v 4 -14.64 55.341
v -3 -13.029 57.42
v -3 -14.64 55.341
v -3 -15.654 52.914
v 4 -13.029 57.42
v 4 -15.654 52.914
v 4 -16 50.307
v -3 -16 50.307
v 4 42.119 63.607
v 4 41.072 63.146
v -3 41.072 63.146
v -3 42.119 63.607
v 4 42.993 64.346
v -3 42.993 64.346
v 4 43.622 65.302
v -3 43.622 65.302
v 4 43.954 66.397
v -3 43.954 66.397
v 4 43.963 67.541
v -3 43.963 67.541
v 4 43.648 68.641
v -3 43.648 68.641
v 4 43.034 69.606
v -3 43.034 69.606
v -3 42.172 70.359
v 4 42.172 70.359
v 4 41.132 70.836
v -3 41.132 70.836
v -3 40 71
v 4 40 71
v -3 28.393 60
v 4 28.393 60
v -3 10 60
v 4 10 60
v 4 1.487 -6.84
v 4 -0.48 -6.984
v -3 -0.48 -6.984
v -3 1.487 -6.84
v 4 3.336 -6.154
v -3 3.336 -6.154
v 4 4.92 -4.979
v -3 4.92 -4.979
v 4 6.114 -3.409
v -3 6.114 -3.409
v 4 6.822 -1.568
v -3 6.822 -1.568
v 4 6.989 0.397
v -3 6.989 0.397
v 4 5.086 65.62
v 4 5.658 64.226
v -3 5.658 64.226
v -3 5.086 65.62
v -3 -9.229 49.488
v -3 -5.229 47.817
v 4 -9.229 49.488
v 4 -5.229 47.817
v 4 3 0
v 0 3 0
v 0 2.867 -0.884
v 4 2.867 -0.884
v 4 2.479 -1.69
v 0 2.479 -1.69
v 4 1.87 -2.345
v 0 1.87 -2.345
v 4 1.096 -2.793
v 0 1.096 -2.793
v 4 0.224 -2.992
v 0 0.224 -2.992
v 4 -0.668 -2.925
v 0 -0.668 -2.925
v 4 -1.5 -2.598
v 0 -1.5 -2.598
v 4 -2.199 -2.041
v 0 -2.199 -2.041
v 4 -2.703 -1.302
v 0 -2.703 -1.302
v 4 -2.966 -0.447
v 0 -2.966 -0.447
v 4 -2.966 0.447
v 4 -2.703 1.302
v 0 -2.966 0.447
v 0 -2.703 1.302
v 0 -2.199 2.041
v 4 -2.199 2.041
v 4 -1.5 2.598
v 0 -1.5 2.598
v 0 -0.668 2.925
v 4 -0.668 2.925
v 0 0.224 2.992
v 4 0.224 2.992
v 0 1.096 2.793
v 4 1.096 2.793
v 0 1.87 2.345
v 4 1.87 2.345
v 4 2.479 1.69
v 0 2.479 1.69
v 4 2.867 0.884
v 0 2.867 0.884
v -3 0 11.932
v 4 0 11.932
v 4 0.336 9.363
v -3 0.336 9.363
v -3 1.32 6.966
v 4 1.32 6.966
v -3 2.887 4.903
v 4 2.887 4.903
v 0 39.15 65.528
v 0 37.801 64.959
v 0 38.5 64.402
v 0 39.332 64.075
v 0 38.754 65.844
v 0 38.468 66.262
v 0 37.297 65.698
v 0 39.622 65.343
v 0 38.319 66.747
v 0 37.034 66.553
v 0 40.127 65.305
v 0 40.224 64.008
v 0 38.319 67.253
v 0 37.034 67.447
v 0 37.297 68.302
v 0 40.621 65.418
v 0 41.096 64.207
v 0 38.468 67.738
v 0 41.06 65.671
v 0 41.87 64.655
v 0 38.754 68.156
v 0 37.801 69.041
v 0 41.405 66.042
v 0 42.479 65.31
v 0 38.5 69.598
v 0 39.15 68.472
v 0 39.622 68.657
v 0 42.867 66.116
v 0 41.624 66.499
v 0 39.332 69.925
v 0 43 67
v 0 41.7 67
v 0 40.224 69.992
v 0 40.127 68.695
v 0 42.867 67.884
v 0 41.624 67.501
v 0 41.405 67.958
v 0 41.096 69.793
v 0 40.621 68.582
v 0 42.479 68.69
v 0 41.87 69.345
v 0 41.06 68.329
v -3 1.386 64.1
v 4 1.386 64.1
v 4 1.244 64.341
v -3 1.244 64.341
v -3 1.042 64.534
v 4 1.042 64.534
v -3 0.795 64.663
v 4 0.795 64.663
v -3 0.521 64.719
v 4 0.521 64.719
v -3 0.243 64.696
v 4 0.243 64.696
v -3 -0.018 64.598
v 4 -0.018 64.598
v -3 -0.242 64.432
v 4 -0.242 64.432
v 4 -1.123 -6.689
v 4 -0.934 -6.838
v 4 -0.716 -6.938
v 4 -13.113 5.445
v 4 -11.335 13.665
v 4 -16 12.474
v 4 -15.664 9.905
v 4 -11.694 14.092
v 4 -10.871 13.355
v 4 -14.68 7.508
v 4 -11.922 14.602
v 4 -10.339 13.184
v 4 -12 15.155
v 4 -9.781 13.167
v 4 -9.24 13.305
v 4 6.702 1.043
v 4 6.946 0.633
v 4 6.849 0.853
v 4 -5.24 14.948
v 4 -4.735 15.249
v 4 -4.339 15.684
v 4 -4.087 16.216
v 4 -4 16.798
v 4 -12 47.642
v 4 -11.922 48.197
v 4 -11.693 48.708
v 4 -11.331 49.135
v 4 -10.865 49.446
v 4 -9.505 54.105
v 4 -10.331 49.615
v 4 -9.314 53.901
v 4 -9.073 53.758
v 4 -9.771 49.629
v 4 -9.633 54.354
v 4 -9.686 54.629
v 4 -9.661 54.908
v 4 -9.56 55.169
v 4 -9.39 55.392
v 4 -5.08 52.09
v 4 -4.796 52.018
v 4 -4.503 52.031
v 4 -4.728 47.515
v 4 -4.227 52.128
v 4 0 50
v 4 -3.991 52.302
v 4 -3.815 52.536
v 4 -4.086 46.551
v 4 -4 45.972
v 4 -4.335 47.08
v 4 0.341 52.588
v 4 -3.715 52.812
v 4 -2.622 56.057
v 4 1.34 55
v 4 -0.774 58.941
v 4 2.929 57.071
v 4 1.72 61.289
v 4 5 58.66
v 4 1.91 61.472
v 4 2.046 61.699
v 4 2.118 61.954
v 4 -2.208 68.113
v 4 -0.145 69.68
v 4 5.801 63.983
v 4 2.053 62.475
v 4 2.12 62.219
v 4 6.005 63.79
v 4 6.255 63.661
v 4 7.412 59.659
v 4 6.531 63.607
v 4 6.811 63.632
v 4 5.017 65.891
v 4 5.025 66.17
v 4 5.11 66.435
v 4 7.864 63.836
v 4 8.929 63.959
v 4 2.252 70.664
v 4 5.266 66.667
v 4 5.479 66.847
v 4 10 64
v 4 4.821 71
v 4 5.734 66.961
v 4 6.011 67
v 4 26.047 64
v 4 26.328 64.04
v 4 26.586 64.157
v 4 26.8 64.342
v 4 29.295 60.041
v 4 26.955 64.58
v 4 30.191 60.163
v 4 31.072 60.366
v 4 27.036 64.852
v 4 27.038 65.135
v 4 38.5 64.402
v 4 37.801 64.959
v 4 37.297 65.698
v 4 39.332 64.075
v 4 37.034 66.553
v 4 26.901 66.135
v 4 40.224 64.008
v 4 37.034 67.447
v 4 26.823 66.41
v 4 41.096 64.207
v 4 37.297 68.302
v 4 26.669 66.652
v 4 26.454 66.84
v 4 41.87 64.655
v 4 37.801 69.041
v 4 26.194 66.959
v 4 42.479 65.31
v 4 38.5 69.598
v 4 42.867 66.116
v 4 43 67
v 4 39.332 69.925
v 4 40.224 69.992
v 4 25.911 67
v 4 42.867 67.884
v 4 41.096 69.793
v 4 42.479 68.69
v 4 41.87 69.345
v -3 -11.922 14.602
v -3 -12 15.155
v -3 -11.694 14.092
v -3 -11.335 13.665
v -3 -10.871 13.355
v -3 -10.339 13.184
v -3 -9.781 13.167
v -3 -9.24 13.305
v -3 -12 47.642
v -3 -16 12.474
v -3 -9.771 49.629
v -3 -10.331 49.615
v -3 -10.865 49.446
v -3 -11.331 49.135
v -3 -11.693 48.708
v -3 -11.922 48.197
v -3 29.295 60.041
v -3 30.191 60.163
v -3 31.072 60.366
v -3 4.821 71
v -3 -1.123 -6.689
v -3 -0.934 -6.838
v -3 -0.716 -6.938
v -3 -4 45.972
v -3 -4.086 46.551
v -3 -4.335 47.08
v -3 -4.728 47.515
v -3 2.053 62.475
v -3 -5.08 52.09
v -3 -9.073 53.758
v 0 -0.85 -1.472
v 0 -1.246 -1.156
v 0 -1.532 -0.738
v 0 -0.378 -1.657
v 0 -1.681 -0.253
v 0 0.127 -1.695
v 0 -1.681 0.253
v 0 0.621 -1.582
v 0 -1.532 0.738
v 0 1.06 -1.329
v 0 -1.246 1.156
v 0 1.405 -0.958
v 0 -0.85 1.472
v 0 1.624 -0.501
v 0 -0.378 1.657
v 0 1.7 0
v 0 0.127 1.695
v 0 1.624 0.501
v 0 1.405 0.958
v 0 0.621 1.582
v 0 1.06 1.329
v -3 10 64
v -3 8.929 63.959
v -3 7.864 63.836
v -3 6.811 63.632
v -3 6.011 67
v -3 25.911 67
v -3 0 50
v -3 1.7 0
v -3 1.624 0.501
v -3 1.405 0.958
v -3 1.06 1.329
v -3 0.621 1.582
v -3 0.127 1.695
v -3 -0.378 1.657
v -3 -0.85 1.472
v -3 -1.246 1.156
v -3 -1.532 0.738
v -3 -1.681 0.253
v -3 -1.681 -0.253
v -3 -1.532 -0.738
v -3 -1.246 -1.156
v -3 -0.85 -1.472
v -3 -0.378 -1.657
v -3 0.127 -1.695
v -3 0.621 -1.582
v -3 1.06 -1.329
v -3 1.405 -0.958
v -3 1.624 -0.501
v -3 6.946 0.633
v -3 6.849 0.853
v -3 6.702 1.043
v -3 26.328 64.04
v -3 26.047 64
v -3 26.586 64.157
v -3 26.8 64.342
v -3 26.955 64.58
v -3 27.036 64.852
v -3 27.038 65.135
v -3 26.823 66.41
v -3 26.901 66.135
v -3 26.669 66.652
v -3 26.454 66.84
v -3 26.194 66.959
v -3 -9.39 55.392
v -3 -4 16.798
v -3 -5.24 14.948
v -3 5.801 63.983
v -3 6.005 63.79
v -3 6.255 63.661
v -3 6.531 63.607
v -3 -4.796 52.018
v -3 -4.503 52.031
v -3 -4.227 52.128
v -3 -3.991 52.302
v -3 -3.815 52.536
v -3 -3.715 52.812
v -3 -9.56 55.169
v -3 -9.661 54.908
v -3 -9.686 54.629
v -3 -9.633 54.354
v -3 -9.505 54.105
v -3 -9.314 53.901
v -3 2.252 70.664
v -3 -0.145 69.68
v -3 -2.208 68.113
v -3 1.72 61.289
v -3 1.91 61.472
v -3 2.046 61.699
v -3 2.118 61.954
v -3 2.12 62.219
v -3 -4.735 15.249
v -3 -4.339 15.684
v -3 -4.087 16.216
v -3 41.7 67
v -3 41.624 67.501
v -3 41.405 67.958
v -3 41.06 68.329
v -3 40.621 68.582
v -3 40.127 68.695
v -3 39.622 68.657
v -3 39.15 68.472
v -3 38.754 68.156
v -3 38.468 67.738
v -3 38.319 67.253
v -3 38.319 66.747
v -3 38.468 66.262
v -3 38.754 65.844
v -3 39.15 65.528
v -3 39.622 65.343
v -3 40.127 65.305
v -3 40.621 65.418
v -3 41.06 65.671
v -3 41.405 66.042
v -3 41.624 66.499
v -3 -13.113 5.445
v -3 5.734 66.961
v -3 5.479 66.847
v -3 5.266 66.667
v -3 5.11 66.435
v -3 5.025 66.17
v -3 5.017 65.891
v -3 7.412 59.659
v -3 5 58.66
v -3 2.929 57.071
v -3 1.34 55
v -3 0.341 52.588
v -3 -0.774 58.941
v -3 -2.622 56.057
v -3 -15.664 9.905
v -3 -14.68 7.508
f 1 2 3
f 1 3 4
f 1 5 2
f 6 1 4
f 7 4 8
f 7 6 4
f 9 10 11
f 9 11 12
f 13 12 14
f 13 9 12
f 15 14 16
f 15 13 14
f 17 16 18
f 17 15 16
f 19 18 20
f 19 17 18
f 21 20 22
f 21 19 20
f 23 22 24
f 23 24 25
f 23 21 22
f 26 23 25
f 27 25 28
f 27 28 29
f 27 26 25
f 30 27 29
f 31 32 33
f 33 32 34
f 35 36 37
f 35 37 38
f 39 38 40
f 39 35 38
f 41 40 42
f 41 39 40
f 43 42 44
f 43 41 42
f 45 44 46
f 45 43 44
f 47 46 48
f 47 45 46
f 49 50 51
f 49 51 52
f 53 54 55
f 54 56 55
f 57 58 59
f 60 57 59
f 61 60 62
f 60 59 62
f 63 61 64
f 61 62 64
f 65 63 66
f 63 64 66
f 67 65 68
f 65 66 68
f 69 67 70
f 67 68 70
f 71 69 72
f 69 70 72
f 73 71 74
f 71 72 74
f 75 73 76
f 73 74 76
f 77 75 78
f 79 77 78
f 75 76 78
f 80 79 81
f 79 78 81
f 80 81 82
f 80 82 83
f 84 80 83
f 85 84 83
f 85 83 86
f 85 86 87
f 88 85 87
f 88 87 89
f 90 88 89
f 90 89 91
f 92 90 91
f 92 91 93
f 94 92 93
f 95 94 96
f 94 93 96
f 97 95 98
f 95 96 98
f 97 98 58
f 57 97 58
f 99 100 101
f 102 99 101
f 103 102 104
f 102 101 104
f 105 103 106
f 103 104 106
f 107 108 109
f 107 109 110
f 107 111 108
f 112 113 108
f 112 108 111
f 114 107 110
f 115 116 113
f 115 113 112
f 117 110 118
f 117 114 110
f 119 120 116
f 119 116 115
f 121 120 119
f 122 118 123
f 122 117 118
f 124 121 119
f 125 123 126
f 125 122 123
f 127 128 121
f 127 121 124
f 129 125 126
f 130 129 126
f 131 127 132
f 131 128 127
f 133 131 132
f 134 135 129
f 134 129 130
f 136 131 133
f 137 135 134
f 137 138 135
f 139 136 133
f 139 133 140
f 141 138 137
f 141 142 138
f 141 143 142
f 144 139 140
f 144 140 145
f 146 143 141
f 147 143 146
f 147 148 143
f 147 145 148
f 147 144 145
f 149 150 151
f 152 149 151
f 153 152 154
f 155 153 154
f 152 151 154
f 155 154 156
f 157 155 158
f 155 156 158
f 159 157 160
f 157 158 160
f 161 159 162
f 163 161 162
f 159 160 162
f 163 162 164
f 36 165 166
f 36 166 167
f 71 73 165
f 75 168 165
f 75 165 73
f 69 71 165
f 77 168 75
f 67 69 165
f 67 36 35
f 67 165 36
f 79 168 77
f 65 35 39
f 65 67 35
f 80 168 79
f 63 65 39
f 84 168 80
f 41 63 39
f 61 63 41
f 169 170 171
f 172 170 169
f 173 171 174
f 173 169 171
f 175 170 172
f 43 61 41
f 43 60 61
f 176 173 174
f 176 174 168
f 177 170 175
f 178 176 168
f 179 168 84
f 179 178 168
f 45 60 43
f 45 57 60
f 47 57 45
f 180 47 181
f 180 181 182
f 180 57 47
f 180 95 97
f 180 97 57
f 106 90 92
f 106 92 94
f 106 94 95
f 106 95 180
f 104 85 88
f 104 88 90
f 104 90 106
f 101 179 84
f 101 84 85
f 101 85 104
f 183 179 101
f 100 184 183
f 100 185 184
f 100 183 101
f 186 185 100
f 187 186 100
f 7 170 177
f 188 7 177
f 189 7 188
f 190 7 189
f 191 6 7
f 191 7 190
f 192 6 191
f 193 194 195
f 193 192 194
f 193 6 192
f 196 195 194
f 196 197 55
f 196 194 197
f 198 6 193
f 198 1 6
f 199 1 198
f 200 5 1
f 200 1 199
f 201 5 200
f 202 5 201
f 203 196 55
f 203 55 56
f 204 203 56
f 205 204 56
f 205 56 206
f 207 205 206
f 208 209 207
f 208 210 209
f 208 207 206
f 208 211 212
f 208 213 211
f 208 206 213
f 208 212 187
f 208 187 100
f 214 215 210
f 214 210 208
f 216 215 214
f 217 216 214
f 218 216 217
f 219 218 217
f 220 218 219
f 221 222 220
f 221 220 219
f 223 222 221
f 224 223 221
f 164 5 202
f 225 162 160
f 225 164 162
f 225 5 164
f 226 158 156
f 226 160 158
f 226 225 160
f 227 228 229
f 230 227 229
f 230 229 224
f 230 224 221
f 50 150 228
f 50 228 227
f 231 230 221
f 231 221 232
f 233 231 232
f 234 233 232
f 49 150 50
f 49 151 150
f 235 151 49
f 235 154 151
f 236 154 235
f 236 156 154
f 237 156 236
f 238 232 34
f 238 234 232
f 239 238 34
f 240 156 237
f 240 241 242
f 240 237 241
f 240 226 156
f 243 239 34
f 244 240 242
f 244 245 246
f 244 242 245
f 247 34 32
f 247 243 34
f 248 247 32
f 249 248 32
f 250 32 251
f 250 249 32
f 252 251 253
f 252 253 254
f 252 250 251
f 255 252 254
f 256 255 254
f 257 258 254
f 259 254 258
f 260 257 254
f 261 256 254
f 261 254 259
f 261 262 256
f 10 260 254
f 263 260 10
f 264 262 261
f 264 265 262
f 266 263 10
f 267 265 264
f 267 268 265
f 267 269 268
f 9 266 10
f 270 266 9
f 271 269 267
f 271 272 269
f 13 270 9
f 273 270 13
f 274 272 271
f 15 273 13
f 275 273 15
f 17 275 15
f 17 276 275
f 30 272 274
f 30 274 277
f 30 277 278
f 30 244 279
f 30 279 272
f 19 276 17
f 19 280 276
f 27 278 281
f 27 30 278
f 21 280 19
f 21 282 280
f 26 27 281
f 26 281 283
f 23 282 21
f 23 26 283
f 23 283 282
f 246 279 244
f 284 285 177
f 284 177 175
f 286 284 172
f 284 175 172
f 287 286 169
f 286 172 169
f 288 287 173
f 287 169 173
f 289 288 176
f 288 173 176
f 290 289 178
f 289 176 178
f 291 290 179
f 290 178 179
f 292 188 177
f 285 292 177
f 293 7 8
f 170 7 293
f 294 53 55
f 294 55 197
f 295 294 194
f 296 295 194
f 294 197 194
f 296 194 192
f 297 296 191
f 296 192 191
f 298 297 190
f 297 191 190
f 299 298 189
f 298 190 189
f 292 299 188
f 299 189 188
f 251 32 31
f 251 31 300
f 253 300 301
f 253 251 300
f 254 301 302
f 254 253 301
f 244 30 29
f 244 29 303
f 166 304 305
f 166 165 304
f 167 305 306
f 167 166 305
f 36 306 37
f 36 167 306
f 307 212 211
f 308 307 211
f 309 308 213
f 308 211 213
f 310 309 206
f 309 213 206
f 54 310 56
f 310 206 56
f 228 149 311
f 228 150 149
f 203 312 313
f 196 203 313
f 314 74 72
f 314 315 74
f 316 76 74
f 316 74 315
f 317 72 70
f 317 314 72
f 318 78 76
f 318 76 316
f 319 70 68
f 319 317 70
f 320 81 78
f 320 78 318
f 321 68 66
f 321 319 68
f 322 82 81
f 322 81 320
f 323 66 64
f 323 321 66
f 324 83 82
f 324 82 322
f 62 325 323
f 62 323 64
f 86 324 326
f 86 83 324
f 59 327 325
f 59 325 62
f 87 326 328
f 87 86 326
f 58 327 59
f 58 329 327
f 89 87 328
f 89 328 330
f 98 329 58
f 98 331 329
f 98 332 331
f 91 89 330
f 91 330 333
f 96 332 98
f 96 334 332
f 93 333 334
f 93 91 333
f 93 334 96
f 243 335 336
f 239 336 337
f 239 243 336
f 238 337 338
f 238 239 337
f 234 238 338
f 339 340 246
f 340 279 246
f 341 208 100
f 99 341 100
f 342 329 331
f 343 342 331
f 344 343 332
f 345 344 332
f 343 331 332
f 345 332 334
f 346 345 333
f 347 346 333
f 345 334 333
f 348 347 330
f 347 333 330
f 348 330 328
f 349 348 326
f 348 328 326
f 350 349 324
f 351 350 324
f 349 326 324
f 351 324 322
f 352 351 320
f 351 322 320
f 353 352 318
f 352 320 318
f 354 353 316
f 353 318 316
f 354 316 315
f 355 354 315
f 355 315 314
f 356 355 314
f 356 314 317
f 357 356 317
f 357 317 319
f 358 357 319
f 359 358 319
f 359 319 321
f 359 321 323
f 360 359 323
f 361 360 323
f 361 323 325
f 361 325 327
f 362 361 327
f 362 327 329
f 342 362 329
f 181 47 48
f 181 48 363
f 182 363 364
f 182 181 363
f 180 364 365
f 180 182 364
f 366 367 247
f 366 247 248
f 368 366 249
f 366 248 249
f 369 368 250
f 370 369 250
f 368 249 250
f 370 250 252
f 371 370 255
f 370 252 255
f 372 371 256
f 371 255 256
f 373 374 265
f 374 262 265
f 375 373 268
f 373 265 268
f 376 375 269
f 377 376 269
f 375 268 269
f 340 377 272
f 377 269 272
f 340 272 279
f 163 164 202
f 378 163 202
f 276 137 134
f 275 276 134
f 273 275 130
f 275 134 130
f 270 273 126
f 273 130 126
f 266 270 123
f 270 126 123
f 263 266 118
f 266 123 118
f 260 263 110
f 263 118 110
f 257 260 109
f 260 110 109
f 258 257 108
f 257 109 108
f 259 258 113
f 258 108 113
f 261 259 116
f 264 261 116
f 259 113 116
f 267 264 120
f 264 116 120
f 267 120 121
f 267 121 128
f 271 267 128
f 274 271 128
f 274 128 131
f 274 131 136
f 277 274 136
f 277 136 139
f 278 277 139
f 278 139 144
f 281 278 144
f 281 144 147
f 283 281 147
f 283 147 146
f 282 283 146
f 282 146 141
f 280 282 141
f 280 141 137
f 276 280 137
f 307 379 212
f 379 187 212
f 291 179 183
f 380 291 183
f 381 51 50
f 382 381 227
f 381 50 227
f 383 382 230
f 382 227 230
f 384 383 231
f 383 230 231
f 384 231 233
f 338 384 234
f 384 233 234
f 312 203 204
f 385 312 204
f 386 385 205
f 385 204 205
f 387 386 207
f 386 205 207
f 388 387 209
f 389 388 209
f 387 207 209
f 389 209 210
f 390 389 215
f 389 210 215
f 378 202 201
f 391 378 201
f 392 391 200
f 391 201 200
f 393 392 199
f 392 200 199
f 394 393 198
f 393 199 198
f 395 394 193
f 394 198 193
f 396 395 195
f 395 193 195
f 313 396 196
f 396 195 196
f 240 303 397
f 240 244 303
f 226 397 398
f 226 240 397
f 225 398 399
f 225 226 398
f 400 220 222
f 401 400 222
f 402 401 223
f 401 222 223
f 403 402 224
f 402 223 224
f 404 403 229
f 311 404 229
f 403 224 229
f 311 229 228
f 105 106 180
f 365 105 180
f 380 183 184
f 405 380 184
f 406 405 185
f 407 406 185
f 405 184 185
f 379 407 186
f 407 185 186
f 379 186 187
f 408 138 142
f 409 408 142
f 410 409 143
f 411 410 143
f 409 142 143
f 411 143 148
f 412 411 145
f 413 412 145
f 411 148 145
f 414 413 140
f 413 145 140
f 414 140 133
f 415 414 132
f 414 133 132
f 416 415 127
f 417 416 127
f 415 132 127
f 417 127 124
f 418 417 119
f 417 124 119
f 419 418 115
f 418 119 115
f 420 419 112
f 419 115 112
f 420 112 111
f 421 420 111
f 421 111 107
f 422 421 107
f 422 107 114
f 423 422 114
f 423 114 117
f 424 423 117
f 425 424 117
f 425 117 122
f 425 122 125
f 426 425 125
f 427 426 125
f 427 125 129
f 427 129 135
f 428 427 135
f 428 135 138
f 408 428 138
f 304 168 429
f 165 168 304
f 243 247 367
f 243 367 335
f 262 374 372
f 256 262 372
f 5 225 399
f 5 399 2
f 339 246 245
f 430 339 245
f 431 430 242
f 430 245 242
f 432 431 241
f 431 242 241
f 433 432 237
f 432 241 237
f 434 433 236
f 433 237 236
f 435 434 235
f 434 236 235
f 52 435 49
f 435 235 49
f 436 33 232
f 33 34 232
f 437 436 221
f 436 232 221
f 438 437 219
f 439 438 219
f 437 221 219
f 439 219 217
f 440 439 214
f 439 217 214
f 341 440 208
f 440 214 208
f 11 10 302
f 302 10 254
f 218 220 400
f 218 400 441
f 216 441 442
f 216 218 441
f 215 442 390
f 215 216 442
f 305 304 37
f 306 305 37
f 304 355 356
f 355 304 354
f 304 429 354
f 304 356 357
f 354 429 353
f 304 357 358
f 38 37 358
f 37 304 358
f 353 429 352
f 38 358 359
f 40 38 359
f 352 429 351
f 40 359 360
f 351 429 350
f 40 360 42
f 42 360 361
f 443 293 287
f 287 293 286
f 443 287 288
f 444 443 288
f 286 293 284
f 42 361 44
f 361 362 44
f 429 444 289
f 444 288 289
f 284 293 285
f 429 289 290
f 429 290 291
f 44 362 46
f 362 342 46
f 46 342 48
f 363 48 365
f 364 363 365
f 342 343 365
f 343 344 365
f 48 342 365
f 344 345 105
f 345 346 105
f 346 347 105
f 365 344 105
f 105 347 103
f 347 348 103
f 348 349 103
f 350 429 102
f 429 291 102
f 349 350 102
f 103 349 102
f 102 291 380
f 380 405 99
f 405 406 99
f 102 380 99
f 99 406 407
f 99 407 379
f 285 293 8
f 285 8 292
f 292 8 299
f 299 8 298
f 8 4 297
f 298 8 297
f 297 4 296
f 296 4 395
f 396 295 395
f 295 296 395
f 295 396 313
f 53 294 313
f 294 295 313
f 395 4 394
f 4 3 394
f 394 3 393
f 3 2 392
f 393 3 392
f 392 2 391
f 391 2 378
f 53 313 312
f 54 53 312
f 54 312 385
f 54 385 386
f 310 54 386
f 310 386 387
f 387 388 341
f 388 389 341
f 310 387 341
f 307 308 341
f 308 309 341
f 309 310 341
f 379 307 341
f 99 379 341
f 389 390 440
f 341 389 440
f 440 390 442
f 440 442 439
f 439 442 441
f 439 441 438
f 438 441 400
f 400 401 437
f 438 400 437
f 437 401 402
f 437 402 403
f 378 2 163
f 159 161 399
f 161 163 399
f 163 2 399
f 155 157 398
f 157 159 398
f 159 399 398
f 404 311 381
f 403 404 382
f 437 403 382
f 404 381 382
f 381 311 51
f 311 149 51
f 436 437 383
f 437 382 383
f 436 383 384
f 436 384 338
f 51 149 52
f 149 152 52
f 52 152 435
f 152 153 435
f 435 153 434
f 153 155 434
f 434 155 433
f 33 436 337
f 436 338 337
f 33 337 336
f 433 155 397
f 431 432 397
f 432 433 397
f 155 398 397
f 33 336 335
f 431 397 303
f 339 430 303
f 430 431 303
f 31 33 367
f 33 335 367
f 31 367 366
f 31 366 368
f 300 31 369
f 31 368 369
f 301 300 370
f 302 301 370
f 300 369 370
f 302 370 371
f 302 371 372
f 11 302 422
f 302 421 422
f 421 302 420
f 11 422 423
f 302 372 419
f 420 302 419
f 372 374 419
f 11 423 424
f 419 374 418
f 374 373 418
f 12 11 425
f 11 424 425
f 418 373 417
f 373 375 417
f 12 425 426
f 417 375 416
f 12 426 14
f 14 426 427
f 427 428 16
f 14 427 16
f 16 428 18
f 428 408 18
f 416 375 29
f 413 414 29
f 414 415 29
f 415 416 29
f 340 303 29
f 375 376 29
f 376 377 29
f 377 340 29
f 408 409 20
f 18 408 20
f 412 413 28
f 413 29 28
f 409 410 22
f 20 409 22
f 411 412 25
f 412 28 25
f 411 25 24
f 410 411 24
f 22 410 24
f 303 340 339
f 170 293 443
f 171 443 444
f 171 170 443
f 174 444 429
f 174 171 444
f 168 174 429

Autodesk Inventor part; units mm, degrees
ref_plane "YZ Plane" through (0, 0, 0) normal (1, 0, 0) x (0, 1, 0)
ref_plane "XZ Plane" through (0, 0, 0) normal (0, 1, 0) x (-1, 0, 0)
ref_plane "XY Plane" through (0, 0, 0) normal (0, 0, 1) x (1, 0, 0)
sketch "SwingArm A" plane through (0, 0, 0) normal (0, 0, 1) x (1, 0, 0)
  line L0 (-13.1129, 5.4447) -> (-1.1226, -6.6888)
  arc A0 (6.9887, 0.3969) -> (6.7016, 1.0431) centre (5.9903, 0.3402) ccw
  arc A1 (-1.1226, -6.6888) -> (-0.4798, -6.9835) centre (-0.4113, -5.9859) ccw
  line L1 (40, 71) -> (4.8211, 71)
  line L2 (28.3926, 60) -> (0, 60) construction
  line L3 (-2.2079, 68.1129) -> (-13.029, 57.4195)
  line L4 (-16, 50.3066) -> (-16, 12.4737)
  line L5 (0, 60) -> (0, 11.9322) construction
  line L6 (2.8871, 4.9032) -> (6.7016, 1.0431)
  circle A2 centre (0, 0) radius 1.7
  circle A3 centre (40, 67) radius 1.7
  line L7 (40, 67) -> (-8, 67) construction
  line L8 (-8, 67) -> (-8, 8.0955) construction
  line L9 (-8, 8.0955) -> (0, 0) construction
  line L10 (41.0716, 63.1462) -> (31.0716, 60.3655)
  arc A4 (28.3926, 60) -> (31.0716, 60.3655) centre (28.3926, 70) ccw
  circle A5 centre (40, 67) radius 4 construction
  arc A6 (41.0716, 63.1462) -> (40, 71) centre (40, 67) ccw
  circle A7 centre (0, 0) radius 5.5 construction
  arc A8 (10, 60) -> (0, 50) centre (10, 50) ccw
  arc A9 (0, 11.9322) -> (2.8871, 4.9032) centre (10, 11.9322) ccw
  arc A10 (-16, 12.4737) -> (-13.1129, 5.4447) centre (-6, 12.4737) ccw
  arc A11 (-13.029, 57.4195) -> (-16, 50.3066) centre (-6, 50.3066) ccw
  arc A12 (4.8211, 71) -> (-2.2079, 68.1129) centre (4.8211, 61) ccw
  line L11 (-9.2401, 13.305) -> (-5.2401, 14.948)
  line L12 (-4, 16.798) -> (-4, 45.9717)
  line L13 (-5.2292, 47.8172) -> (-9.2292, 49.488)
  line L14 (-12, 47.6425) -> (-12, 15.155)
  arc A13 (-4, 45.9717) -> (-5.2292, 47.8172) centre (-6, 45.9717) ccw
  arc A14 (-9.2292, 49.488) -> (-12, 47.6425) centre (-10, 47.6425) ccw
  arc A15 (-5.2401, 14.948) -> (-4, 16.798) centre (-6, 16.798) ccw
  arc A16 (-12, 15.155) -> (-9.2401, 13.305) centre (-10, 15.155) ccw
  line L15 (28.3926, 60) -> (10, 60)
  line L16 (0, 50) -> (0, 11.9322)
  line L17 (1.3855, 64.1003) -> (2.0531, 62.4749)
  line L18 (-5.0798, 52.0897) -> (-9.0729, 53.7576)
  line L19 (-0.2424, 64.4316) -> (-9.3904, 55.3916)
  arc A17 (1.7195, 61.2887) -> (2.0531, 62.4749) centre (1.1281, 62.095) ccw
  arc A18 (1.3855, 64.1003) -> (-0.2424, 64.4316) centre (0.4605, 63.7204) ccw
  arc A19 (-5.0798, 52.0897) -> (-3.7148, 52.8116) centre (-4.6944, 53.0125) ccw
  arc A20 (-9.3904, 55.3916) -> (-9.0729, 53.7576) centre (-8.6875, 54.6803) ccw
  line L20 (-15.2274, 54.1608) -> (0, 47.8005) construction
  arc A21 (-0.4798, -6.9835) -> (6.9887, 0.3969) centre (0, 0) ccw
  arc A22 (1.7195, 61.2887) -> (-3.7148, 52.8116) centre (10, 50) ccw
  line L21 (0.0419, 2.0916) -> (2.8931, -0.7936) construction
  arc A23 (0.7592, -2.9023) -> (2.8931, -0.7936) centre (0, 0) ccw construction
  line L22 (0.7592, -2.9023) -> (-10.2677, 8.2563) construction
  arc A24 (-12, 12.4737) -> (-10.2677, 8.2563) centre (-6, 12.4737) ccw construction
  line L23 (-12, 12.4737) -> (-12, 50.3066) construction
  arc A25 (-10.2174, 54.5744) -> (-12, 50.3066) centre (-6, 50.3066) ccw construction
  line L24 (-10.2174, 54.5744) -> (0.6037, 65.2677) construction
  arc A26 (4.8211, 67) -> (0.6037, 65.2677) centre (4.8211, 61) ccw construction
  line L25 (4.8211, 67) -> (40, 67) construction
  line L26 (40, 67) -> (30, 64.2193) construction
  arc A27 (28.3926, 64) -> (30, 64.2193) centre (28.3926, 70) ccw construction
  line L27 (28.3926, 64) -> (10, 64) construction
  arc A28 (10, 64) -> (-4, 50) centre (10, 50) ccw construction
  line L28 (-4, 50) -> (-4, 11.9322) construction
  arc A29 (-4, 11.9322) -> (0.0419, 2.0916) centre (10, 11.9322) ccw construction
  line L29 (-15.2501, 8.6743) -> (0, 14.9381) construction
  line L30 (1.0217, 70.2501) -> (5.6423, 59.0006) construction
  line L31 (29.7445, 60.0918) -> (28.2561, 71) construction
  line L32 (5.6582, 64.2257) -> (5.0855, 65.6201)
  line L33 (26.9014, 66.1352) -> (27.0378, 65.1352)
  line L34 (25.9106, 67) -> (6.0106, 67)
  line L35 (26.047, 64) -> (10, 64)
  arc A30 (10, 64) -> (6.811, 63.632) centre (10, 50) ccw
  arc A31 (5.6582, 64.2257) -> (6.811, 63.632) centre (6.5833, 64.6057) ccw
  arc A32 (6.0106, 67) -> (5.0855, 65.6201) centre (6.0106, 66) ccw
  arc A33 (26.9014, 66.1352) -> (25.9106, 67) centre (25.9106, 66) ccw
  arc A34 (26.047, 64) -> (27.0378, 65.1352) centre (26.047, 65) ccw
  point P0 (-12, 31.3902)
  point P1 (-16, 31.3902)
  dimension "d0" = 3.4
  dimension "d1" = 3.4
  dimension "d2" = 7
  dimension "d3" = 4
  dimension "d6" = 10
  dimension "d7" = 16
  dimension "d8" = 67
  dimension "d9" = 10
  dimension "d10" = 10
  dimension "d11" = 10
  dimension "d12" = 10
  dimension "d13" = 10
  dimension "d14" = 40
  dimension "d15" = 134.66
  dimension "d16" = 2
  dimension "d17" = 2
  dimension "d18" = 1
  dimension "d20" = 4
  dimension "d24" = 10
  dimension "d25" = 50
  dimension "d32" = 7
  dimension "d33" = 11
  dimension "d34" = 1
  dimension "d35" = 4
  dimension "d37" = 2
  dimension "d38" = 4
  dimension "d39" = 1
  dimension "d41" = 2
  dimension "d42" = 1
  dimension "d43" = 1
sketch "Skizze1" plane through (0, 0, 0) normal (1, 0, 0) x (0, 1, 0)
  circle A0 centre (40, 67) radius 3
  circle A1 centre (0, 0) radius 3
  line L0 (-13.1129, 5.4447) -> (-1.1226, -6.6888)
  arc A2 (6.9887, 0.3969) -> (6.7016, 1.0431) centre (5.9903, 0.3402) ccw
  arc A3 (-1.1226, -6.6888) -> (-0.4798, -6.9835) centre (-0.4113, -5.9859) ccw
  line L1 (40, 71) -> (4.8211, 71)
  line L2 (28.3926, 60) -> (0, 60) construction
  line L3 (-2.2079, 68.1129) -> (-13.029, 57.4195)
  line L4 (-16, 50.3066) -> (-16, 12.4737)
  line L5 (0, 60) -> (0, 11.9322) construction
  line L6 (2.8871, 4.9032) -> (6.7016, 1.0431)
  circle A4 centre (0, 0) radius 1.7
  circle A5 centre (40, 67) radius 1.7
  line L7 (40, 67) -> (-8, 67) construction
  line L8 (-8, 67) -> (-8, 8.0955) construction
  line L9 (-8, 8.0955) -> (0, 0) construction
  line L10 (41.0716, 63.1462) -> (31.0716, 60.3655)
  arc A6 (28.3926, 60) -> (31.0716, 60.3655) centre (28.3926, 70) ccw
  circle A7 centre (40, 67) radius 4 construction
  arc A8 (41.0716, 63.1462) -> (40, 71) centre (40, 67) ccw
  circle A9 centre (0, 0) radius 5.5 construction
  arc A10 (10, 60) -> (0, 50) centre (10, 50) ccw
  arc A11 (0, 11.9322) -> (2.8871, 4.9032) centre (10, 11.9322) ccw
  arc A12 (-16, 12.4737) -> (-13.1129, 5.4447) centre (-6, 12.4737) ccw
  arc A13 (-13.029, 57.4195) -> (-16, 50.3066) centre (-6, 50.3066) ccw
  arc A14 (4.8211, 71) -> (-2.2079, 68.1129) centre (4.8211, 61) ccw
  line L11 (-9.2401, 13.305) -> (-5.2401, 14.948)
  line L12 (-4, 16.798) -> (-4, 45.9717)
  line L13 (-5.2292, 47.8172) -> (-9.2292, 49.488)
  line L14 (-12, 47.6425) -> (-12, 15.155)
  arc A15 (-4, 45.9717) -> (-5.2292, 47.8172) centre (-6, 45.9717) ccw
  arc A16 (-9.2292, 49.488) -> (-12, 47.6425) centre (-10, 47.6425) ccw
  arc A17 (-5.2401, 14.948) -> (-4, 16.798) centre (-6, 16.798) ccw
  arc A18 (-12, 15.155) -> (-9.2401, 13.305) centre (-10, 15.155) ccw
  line L15 (28.3926, 60) -> (10, 60)
  line L16 (0, 50) -> (0, 11.9322)
  line L17 (1.3855, 64.1003) -> (2.0531, 62.4749)
  line L18 (-5.0798, 52.0897) -> (-9.0729, 53.7576)
  line L19 (-0.2424, 64.4316) -> (-9.3904, 55.3916)
  arc A19 (1.7195, 61.2887) -> (2.0531, 62.4749) centre (1.1281, 62.095) ccw
  arc A20 (1.3855, 64.1003) -> (-0.2424, 64.4316) centre (0.4605, 63.7204) ccw
  arc A21 (-5.0798, 52.0897) -> (-3.7148, 52.8116) centre (-4.6944, 53.0125) ccw
  arc A22 (-9.3904, 55.3916) -> (-9.0729, 53.7576) centre (-8.6875, 54.6803) ccw
  line L20 (-15.2274, 54.1608) -> (0, 47.8005) construction
  arc A23 (-0.4798, -6.9835) -> (6.9887, 0.3969) centre (0, 0) ccw
  arc A24 (1.7195, 61.2887) -> (-3.7148, 52.8116) centre (10, 50) ccw
  line L21 (0.0419, 2.0916) -> (2.8931, -0.7936) construction
  arc A25 (0.7592, -2.9023) -> (2.8931, -0.7936) centre (0, 0) ccw construction
  line L22 (0.7592, -2.9023) -> (-10.2677, 8.2563) construction
  arc A26 (-12, 12.4737) -> (-10.2677, 8.2563) centre (-6, 12.4737) ccw construction
  line L23 (-12, 12.4737) -> (-12, 50.3066) construction
  arc A27 (-10.2174, 54.5744) -> (-12, 50.3066) centre (-6, 50.3066) ccw construction
  line L24 (-10.2174, 54.5744) -> (0.6037, 65.2677) construction
  arc A28 (4.8211, 67) -> (0.6037, 65.2677) centre (4.8211, 61) ccw construction
  line L25 (4.8211, 67) -> (40, 67) construction
  line L26 (40, 67) -> (30, 64.2193) construction
  arc A29 (28.3926, 64) -> (30, 64.2193) centre (28.3926, 70) ccw construction
  line L27 (28.3926, 64) -> (10, 64) construction
  arc A30 (10, 64) -> (-4, 50) centre (10, 50) ccw construction
  line L28 (-4, 50) -> (-4, 11.9322) construction
  arc A31 (-4, 11.9322) -> (0.0419, 2.0916) centre (10, 11.9322) ccw construction
  line L29 (-15.2501, 8.6743) -> (0, 14.9381) construction
  line L30 (1.0217, 70.2501) -> (5.6423, 59.0006) construction
  line L31 (29.7445, 60.0918) -> (28.2561, 71) construction
  line L32 (5.6582, 64.2257) -> (5.0855, 65.6201)
  line L33 (26.9014, 66.1352) -> (27.0378, 65.1352)
  line L34 (25.9106, 67) -> (6.0106, 67)
  line L35 (26.047, 64) -> (10, 64)
  arc A32 (10, 64) -> (6.811, 63.632) centre (10, 50) ccw
  arc A33 (5.6582, 64.2257) -> (6.811, 63.632) centre (6.5833, 64.6057) ccw
  arc A34 (6.0106, 67) -> (5.0855, 65.6201) centre (6.0106, 66) ccw
  arc A35 (26.9014, 66.1352) -> (25.9106, 67) centre (25.9106, 66) ccw
  arc A36 (26.047, 64) -> (27.0378, 65.1352) centre (26.047, 65) ccw
  dimension "d44" = 6
  dimension "d45" = 6
extrude "Extrusion1" add sketch "Skizze1" along normal blind 4 and the other way blind 3 contours A0 | A1 | A12 L4 A13 L3 A14 L1 A8 L10 A6 L15 A10 L16 A11 L6 A2 A23 A3 L0
extrude "Extrusion2" cut sketch "Skizze1" along normal through all contours A0 | A1
properties part number "Swing-Arm A" material "ABS-Kunststoff"
